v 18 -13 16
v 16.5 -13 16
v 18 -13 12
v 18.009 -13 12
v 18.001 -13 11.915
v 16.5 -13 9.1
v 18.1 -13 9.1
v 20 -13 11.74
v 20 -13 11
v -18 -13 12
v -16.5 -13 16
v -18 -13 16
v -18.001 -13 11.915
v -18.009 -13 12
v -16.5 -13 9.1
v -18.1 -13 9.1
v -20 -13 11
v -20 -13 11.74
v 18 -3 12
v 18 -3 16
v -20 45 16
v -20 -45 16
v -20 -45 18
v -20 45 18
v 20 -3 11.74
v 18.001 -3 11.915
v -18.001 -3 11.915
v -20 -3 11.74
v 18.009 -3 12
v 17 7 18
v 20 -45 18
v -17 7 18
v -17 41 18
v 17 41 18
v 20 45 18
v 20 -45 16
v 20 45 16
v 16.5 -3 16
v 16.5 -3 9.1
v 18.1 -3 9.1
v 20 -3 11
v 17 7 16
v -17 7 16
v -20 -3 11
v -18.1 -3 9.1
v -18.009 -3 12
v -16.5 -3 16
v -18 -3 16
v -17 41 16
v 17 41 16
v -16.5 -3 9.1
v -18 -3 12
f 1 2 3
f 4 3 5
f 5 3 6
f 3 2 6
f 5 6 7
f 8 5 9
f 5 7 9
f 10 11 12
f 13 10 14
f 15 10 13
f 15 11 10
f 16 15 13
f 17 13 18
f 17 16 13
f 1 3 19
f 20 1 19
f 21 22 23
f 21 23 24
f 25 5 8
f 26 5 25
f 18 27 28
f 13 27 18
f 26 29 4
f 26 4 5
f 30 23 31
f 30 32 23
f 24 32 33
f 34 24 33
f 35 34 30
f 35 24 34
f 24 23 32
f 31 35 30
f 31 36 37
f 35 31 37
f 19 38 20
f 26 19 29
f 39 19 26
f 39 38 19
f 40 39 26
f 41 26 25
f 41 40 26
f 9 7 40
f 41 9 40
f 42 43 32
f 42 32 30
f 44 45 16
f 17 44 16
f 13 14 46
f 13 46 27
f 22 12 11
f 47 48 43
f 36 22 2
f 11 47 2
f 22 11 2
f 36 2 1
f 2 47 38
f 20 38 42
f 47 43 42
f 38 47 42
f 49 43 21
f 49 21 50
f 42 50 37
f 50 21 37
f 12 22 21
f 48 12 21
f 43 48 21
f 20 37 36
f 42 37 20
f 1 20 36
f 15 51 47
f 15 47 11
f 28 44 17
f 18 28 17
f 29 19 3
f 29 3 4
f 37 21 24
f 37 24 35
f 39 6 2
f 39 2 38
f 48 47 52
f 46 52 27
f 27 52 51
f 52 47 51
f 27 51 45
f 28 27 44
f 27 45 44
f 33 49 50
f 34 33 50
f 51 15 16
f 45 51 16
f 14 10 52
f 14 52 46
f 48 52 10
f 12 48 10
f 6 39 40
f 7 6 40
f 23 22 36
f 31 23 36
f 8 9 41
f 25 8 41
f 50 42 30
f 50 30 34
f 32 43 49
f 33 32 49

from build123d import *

# Parameters (mm, degrees)
BOX010_W               = 4
BOX010_H               = 10
BOX010_DEPTH           = 7
BOX010_PLACEMENT_ANGLE = 95
BOX009_W               = 4
BOX009_H               = 10
BOX009_DEPTH           = 7
BOX009_PLACEMENT_ANGLE = 45
BOX011_W               = 3.5
BOX011_H               = 10
BOX011_DEPTH           = 6.9
BOX008_W               = 3.5
BOX008_H               = 10
BOX008_DEPTH           = 6.9
CUT007_PLACEMENT_ANGLE = 180
BOX006_W               = 4
BOX006_H               = 10
BOX006_DEPTH           = 7
BOX006_PLACEMENT_ANGLE = 95
BOX005_W               = 4
BOX005_H               = 10
BOX005_DEPTH           = 7
BOX005_PLACEMENT_ANGLE = 45
BOX007_W               = 3.5
BOX007_H               = 10
BOX007_DEPTH           = 6.9
BOX004_W               = 3.5
BOX004_H               = 10
BOX004_DEPTH           = 6.9
BOX003_W               = 34
BOX003_H               = 34
BOX003_DEPTH           = 10
SKETCH002_W            = 40
SKETCH002_H            = 90
PAD001_DEPTH           = 2


with BuildPart() as cube010:
    # Box010 → Box010 (new body)
    with BuildSketch(Plane.XY):
        with Locations((2, 5)):
            Rectangle(BOX010_W, BOX010_H)
    extrude(amount=BOX010_DEPTH)


with BuildPart() as cube010_1:
    # Box010 placement: moved
    add(cube010.part.moved(Location((18.35, -13, 15.9))).rotate(Axis((18.35, -13, 15.9), (0, 1, 0)), BOX010_PLACEMENT_ANGLE))


with BuildPart() as fusion003:
    # Box009 → Box009 (new body)
    with BuildSketch(Plane.XY):
        with Locations((2, 5)):
            Rectangle(BOX009_W, BOX009_H)
    extrude(amount=BOX009_DEPTH)


with BuildPart() as fusion003_1:
    # Box009 placement: moved
    add(fusion003.part.moved(Location((16, -13, 7))).rotate(Axis((16, -13, 7), (0, 1, 0)), BOX009_PLACEMENT_ANGLE))

    # Fusion003: union Cube010
    add(cube010_1.part)


with BuildPart() as fusion004:
    # Box011 → Box011 (new body)
    with BuildSketch(Plane(origin=(18, -13, 12), x_dir=(1, 0, 0), z_dir=(0, 0, 1))):
        with Locations((1.75, 5)):
            Rectangle(BOX011_W, BOX011_H)
    extrude(amount=BOX011_DEPTH)

    # Fusion004: union Fusion003
    add(fusion003_1.part)


with BuildPart() as bal_karom:
    # Box008 → Box008 (new body)
    with BuildSketch(Plane(origin=(16.5, -13, 9.1), x_dir=(1, 0, 0), z_dir=(0, 0, 1))):
        with Locations((1.75, 5)):
            Rectangle(BOX008_W, BOX008_H)
    extrude(amount=BOX008_DEPTH)

    # Cut007: cut Fusion004
    add(fusion004.part, mode=Mode.SUBTRACT)


with BuildPart() as bal_karom_1:
    # Cut007 placement: moved
    add(bal_karom.part.moved(Location((0, -16, 0))).rotate(Axis((0, -16, 0), (0, 0, 1)), CUT007_PLACEMENT_ANGLE))


with BuildPart() as cube006:
    # Box006 → Box006 (new body)
    with BuildSketch(Plane.XY):
        with Locations((2, 5)):
            Rectangle(BOX006_W, BOX006_H)
    extrude(amount=BOX006_DEPTH)


with BuildPart() as cube006_1:
    # Box006 placement: moved
    add(cube006.part.moved(Location((18.35, -13, 15.9))).rotate(Axis((18.35, -13, 15.9), (0, 1, 0)), BOX006_PLACEMENT_ANGLE))


with BuildPart() as fusion001:
    # Box005 → Box005 (new body)
    with BuildSketch(Plane.XY):
        with Locations((2, 5)):
            Rectangle(BOX005_W, BOX005_H)
    extrude(amount=BOX005_DEPTH)


with BuildPart() as fusion001_1:
    # Box005 placement: moved
    add(fusion001.part.moved(Location((16, -13, 7))).rotate(Axis((16, -13, 7), (0, 1, 0)), BOX005_PLACEMENT_ANGLE))

    # Fusion001: union Cube006
    add(cube006_1.part)


with BuildPart() as fusion002:
    # Box007 → Box007 (new body)
    with BuildSketch(Plane(origin=(18, -13, 12), x_dir=(1, 0, 0), z_dir=(0, 0, 1))):
        with Locations((1.75, 5)):
            Rectangle(BOX007_W, BOX007_H)
    extrude(amount=BOX007_DEPTH)

    # Fusion002: union Fusion001
    add(fusion001_1.part)


with BuildPart() as karmok:
    # Box004 → Box004 (new body)
    with BuildSketch(Plane(origin=(16.5, -13, 9.1), x_dir=(1, 0, 0), z_dir=(0, 0, 1))):
        with Locations((1.75, 5)):
            Rectangle(BOX004_W, BOX004_H)
    extrude(amount=BOX004_DEPTH)

    # Cut006: cut Fusion002
    add(fusion002.part, mode=Mode.SUBTRACT)

    # Fusion005: union Bal karom
    add(bal_karom_1.part)


with BuildPart() as cube003:
    # Box003 → Box003 (new body)
    with BuildSketch(Plane(origin=(-17, 7, 10), x_dir=(1, 0, 0), z_dir=(0, 0, 1))):
        with Locations((17, 17)):
            Rectangle(BOX003_W, BOX003_H)
    extrude(amount=BOX003_DEPTH)


with BuildPart() as felso:
    # Sketch002 → Pad001 (new body)
    with BuildSketch(Plane.XY.offset(16)):
        Rectangle(SKETCH002_W, SKETCH002_H)
    extrude(amount=PAD001_DEPTH)

    # Cut005: cut Cube003
    add(cube003.part, mode=Mode.SUBTRACT)

    # Fusion006: union Karmok
    add(karmok.part)


solid = felso.part
